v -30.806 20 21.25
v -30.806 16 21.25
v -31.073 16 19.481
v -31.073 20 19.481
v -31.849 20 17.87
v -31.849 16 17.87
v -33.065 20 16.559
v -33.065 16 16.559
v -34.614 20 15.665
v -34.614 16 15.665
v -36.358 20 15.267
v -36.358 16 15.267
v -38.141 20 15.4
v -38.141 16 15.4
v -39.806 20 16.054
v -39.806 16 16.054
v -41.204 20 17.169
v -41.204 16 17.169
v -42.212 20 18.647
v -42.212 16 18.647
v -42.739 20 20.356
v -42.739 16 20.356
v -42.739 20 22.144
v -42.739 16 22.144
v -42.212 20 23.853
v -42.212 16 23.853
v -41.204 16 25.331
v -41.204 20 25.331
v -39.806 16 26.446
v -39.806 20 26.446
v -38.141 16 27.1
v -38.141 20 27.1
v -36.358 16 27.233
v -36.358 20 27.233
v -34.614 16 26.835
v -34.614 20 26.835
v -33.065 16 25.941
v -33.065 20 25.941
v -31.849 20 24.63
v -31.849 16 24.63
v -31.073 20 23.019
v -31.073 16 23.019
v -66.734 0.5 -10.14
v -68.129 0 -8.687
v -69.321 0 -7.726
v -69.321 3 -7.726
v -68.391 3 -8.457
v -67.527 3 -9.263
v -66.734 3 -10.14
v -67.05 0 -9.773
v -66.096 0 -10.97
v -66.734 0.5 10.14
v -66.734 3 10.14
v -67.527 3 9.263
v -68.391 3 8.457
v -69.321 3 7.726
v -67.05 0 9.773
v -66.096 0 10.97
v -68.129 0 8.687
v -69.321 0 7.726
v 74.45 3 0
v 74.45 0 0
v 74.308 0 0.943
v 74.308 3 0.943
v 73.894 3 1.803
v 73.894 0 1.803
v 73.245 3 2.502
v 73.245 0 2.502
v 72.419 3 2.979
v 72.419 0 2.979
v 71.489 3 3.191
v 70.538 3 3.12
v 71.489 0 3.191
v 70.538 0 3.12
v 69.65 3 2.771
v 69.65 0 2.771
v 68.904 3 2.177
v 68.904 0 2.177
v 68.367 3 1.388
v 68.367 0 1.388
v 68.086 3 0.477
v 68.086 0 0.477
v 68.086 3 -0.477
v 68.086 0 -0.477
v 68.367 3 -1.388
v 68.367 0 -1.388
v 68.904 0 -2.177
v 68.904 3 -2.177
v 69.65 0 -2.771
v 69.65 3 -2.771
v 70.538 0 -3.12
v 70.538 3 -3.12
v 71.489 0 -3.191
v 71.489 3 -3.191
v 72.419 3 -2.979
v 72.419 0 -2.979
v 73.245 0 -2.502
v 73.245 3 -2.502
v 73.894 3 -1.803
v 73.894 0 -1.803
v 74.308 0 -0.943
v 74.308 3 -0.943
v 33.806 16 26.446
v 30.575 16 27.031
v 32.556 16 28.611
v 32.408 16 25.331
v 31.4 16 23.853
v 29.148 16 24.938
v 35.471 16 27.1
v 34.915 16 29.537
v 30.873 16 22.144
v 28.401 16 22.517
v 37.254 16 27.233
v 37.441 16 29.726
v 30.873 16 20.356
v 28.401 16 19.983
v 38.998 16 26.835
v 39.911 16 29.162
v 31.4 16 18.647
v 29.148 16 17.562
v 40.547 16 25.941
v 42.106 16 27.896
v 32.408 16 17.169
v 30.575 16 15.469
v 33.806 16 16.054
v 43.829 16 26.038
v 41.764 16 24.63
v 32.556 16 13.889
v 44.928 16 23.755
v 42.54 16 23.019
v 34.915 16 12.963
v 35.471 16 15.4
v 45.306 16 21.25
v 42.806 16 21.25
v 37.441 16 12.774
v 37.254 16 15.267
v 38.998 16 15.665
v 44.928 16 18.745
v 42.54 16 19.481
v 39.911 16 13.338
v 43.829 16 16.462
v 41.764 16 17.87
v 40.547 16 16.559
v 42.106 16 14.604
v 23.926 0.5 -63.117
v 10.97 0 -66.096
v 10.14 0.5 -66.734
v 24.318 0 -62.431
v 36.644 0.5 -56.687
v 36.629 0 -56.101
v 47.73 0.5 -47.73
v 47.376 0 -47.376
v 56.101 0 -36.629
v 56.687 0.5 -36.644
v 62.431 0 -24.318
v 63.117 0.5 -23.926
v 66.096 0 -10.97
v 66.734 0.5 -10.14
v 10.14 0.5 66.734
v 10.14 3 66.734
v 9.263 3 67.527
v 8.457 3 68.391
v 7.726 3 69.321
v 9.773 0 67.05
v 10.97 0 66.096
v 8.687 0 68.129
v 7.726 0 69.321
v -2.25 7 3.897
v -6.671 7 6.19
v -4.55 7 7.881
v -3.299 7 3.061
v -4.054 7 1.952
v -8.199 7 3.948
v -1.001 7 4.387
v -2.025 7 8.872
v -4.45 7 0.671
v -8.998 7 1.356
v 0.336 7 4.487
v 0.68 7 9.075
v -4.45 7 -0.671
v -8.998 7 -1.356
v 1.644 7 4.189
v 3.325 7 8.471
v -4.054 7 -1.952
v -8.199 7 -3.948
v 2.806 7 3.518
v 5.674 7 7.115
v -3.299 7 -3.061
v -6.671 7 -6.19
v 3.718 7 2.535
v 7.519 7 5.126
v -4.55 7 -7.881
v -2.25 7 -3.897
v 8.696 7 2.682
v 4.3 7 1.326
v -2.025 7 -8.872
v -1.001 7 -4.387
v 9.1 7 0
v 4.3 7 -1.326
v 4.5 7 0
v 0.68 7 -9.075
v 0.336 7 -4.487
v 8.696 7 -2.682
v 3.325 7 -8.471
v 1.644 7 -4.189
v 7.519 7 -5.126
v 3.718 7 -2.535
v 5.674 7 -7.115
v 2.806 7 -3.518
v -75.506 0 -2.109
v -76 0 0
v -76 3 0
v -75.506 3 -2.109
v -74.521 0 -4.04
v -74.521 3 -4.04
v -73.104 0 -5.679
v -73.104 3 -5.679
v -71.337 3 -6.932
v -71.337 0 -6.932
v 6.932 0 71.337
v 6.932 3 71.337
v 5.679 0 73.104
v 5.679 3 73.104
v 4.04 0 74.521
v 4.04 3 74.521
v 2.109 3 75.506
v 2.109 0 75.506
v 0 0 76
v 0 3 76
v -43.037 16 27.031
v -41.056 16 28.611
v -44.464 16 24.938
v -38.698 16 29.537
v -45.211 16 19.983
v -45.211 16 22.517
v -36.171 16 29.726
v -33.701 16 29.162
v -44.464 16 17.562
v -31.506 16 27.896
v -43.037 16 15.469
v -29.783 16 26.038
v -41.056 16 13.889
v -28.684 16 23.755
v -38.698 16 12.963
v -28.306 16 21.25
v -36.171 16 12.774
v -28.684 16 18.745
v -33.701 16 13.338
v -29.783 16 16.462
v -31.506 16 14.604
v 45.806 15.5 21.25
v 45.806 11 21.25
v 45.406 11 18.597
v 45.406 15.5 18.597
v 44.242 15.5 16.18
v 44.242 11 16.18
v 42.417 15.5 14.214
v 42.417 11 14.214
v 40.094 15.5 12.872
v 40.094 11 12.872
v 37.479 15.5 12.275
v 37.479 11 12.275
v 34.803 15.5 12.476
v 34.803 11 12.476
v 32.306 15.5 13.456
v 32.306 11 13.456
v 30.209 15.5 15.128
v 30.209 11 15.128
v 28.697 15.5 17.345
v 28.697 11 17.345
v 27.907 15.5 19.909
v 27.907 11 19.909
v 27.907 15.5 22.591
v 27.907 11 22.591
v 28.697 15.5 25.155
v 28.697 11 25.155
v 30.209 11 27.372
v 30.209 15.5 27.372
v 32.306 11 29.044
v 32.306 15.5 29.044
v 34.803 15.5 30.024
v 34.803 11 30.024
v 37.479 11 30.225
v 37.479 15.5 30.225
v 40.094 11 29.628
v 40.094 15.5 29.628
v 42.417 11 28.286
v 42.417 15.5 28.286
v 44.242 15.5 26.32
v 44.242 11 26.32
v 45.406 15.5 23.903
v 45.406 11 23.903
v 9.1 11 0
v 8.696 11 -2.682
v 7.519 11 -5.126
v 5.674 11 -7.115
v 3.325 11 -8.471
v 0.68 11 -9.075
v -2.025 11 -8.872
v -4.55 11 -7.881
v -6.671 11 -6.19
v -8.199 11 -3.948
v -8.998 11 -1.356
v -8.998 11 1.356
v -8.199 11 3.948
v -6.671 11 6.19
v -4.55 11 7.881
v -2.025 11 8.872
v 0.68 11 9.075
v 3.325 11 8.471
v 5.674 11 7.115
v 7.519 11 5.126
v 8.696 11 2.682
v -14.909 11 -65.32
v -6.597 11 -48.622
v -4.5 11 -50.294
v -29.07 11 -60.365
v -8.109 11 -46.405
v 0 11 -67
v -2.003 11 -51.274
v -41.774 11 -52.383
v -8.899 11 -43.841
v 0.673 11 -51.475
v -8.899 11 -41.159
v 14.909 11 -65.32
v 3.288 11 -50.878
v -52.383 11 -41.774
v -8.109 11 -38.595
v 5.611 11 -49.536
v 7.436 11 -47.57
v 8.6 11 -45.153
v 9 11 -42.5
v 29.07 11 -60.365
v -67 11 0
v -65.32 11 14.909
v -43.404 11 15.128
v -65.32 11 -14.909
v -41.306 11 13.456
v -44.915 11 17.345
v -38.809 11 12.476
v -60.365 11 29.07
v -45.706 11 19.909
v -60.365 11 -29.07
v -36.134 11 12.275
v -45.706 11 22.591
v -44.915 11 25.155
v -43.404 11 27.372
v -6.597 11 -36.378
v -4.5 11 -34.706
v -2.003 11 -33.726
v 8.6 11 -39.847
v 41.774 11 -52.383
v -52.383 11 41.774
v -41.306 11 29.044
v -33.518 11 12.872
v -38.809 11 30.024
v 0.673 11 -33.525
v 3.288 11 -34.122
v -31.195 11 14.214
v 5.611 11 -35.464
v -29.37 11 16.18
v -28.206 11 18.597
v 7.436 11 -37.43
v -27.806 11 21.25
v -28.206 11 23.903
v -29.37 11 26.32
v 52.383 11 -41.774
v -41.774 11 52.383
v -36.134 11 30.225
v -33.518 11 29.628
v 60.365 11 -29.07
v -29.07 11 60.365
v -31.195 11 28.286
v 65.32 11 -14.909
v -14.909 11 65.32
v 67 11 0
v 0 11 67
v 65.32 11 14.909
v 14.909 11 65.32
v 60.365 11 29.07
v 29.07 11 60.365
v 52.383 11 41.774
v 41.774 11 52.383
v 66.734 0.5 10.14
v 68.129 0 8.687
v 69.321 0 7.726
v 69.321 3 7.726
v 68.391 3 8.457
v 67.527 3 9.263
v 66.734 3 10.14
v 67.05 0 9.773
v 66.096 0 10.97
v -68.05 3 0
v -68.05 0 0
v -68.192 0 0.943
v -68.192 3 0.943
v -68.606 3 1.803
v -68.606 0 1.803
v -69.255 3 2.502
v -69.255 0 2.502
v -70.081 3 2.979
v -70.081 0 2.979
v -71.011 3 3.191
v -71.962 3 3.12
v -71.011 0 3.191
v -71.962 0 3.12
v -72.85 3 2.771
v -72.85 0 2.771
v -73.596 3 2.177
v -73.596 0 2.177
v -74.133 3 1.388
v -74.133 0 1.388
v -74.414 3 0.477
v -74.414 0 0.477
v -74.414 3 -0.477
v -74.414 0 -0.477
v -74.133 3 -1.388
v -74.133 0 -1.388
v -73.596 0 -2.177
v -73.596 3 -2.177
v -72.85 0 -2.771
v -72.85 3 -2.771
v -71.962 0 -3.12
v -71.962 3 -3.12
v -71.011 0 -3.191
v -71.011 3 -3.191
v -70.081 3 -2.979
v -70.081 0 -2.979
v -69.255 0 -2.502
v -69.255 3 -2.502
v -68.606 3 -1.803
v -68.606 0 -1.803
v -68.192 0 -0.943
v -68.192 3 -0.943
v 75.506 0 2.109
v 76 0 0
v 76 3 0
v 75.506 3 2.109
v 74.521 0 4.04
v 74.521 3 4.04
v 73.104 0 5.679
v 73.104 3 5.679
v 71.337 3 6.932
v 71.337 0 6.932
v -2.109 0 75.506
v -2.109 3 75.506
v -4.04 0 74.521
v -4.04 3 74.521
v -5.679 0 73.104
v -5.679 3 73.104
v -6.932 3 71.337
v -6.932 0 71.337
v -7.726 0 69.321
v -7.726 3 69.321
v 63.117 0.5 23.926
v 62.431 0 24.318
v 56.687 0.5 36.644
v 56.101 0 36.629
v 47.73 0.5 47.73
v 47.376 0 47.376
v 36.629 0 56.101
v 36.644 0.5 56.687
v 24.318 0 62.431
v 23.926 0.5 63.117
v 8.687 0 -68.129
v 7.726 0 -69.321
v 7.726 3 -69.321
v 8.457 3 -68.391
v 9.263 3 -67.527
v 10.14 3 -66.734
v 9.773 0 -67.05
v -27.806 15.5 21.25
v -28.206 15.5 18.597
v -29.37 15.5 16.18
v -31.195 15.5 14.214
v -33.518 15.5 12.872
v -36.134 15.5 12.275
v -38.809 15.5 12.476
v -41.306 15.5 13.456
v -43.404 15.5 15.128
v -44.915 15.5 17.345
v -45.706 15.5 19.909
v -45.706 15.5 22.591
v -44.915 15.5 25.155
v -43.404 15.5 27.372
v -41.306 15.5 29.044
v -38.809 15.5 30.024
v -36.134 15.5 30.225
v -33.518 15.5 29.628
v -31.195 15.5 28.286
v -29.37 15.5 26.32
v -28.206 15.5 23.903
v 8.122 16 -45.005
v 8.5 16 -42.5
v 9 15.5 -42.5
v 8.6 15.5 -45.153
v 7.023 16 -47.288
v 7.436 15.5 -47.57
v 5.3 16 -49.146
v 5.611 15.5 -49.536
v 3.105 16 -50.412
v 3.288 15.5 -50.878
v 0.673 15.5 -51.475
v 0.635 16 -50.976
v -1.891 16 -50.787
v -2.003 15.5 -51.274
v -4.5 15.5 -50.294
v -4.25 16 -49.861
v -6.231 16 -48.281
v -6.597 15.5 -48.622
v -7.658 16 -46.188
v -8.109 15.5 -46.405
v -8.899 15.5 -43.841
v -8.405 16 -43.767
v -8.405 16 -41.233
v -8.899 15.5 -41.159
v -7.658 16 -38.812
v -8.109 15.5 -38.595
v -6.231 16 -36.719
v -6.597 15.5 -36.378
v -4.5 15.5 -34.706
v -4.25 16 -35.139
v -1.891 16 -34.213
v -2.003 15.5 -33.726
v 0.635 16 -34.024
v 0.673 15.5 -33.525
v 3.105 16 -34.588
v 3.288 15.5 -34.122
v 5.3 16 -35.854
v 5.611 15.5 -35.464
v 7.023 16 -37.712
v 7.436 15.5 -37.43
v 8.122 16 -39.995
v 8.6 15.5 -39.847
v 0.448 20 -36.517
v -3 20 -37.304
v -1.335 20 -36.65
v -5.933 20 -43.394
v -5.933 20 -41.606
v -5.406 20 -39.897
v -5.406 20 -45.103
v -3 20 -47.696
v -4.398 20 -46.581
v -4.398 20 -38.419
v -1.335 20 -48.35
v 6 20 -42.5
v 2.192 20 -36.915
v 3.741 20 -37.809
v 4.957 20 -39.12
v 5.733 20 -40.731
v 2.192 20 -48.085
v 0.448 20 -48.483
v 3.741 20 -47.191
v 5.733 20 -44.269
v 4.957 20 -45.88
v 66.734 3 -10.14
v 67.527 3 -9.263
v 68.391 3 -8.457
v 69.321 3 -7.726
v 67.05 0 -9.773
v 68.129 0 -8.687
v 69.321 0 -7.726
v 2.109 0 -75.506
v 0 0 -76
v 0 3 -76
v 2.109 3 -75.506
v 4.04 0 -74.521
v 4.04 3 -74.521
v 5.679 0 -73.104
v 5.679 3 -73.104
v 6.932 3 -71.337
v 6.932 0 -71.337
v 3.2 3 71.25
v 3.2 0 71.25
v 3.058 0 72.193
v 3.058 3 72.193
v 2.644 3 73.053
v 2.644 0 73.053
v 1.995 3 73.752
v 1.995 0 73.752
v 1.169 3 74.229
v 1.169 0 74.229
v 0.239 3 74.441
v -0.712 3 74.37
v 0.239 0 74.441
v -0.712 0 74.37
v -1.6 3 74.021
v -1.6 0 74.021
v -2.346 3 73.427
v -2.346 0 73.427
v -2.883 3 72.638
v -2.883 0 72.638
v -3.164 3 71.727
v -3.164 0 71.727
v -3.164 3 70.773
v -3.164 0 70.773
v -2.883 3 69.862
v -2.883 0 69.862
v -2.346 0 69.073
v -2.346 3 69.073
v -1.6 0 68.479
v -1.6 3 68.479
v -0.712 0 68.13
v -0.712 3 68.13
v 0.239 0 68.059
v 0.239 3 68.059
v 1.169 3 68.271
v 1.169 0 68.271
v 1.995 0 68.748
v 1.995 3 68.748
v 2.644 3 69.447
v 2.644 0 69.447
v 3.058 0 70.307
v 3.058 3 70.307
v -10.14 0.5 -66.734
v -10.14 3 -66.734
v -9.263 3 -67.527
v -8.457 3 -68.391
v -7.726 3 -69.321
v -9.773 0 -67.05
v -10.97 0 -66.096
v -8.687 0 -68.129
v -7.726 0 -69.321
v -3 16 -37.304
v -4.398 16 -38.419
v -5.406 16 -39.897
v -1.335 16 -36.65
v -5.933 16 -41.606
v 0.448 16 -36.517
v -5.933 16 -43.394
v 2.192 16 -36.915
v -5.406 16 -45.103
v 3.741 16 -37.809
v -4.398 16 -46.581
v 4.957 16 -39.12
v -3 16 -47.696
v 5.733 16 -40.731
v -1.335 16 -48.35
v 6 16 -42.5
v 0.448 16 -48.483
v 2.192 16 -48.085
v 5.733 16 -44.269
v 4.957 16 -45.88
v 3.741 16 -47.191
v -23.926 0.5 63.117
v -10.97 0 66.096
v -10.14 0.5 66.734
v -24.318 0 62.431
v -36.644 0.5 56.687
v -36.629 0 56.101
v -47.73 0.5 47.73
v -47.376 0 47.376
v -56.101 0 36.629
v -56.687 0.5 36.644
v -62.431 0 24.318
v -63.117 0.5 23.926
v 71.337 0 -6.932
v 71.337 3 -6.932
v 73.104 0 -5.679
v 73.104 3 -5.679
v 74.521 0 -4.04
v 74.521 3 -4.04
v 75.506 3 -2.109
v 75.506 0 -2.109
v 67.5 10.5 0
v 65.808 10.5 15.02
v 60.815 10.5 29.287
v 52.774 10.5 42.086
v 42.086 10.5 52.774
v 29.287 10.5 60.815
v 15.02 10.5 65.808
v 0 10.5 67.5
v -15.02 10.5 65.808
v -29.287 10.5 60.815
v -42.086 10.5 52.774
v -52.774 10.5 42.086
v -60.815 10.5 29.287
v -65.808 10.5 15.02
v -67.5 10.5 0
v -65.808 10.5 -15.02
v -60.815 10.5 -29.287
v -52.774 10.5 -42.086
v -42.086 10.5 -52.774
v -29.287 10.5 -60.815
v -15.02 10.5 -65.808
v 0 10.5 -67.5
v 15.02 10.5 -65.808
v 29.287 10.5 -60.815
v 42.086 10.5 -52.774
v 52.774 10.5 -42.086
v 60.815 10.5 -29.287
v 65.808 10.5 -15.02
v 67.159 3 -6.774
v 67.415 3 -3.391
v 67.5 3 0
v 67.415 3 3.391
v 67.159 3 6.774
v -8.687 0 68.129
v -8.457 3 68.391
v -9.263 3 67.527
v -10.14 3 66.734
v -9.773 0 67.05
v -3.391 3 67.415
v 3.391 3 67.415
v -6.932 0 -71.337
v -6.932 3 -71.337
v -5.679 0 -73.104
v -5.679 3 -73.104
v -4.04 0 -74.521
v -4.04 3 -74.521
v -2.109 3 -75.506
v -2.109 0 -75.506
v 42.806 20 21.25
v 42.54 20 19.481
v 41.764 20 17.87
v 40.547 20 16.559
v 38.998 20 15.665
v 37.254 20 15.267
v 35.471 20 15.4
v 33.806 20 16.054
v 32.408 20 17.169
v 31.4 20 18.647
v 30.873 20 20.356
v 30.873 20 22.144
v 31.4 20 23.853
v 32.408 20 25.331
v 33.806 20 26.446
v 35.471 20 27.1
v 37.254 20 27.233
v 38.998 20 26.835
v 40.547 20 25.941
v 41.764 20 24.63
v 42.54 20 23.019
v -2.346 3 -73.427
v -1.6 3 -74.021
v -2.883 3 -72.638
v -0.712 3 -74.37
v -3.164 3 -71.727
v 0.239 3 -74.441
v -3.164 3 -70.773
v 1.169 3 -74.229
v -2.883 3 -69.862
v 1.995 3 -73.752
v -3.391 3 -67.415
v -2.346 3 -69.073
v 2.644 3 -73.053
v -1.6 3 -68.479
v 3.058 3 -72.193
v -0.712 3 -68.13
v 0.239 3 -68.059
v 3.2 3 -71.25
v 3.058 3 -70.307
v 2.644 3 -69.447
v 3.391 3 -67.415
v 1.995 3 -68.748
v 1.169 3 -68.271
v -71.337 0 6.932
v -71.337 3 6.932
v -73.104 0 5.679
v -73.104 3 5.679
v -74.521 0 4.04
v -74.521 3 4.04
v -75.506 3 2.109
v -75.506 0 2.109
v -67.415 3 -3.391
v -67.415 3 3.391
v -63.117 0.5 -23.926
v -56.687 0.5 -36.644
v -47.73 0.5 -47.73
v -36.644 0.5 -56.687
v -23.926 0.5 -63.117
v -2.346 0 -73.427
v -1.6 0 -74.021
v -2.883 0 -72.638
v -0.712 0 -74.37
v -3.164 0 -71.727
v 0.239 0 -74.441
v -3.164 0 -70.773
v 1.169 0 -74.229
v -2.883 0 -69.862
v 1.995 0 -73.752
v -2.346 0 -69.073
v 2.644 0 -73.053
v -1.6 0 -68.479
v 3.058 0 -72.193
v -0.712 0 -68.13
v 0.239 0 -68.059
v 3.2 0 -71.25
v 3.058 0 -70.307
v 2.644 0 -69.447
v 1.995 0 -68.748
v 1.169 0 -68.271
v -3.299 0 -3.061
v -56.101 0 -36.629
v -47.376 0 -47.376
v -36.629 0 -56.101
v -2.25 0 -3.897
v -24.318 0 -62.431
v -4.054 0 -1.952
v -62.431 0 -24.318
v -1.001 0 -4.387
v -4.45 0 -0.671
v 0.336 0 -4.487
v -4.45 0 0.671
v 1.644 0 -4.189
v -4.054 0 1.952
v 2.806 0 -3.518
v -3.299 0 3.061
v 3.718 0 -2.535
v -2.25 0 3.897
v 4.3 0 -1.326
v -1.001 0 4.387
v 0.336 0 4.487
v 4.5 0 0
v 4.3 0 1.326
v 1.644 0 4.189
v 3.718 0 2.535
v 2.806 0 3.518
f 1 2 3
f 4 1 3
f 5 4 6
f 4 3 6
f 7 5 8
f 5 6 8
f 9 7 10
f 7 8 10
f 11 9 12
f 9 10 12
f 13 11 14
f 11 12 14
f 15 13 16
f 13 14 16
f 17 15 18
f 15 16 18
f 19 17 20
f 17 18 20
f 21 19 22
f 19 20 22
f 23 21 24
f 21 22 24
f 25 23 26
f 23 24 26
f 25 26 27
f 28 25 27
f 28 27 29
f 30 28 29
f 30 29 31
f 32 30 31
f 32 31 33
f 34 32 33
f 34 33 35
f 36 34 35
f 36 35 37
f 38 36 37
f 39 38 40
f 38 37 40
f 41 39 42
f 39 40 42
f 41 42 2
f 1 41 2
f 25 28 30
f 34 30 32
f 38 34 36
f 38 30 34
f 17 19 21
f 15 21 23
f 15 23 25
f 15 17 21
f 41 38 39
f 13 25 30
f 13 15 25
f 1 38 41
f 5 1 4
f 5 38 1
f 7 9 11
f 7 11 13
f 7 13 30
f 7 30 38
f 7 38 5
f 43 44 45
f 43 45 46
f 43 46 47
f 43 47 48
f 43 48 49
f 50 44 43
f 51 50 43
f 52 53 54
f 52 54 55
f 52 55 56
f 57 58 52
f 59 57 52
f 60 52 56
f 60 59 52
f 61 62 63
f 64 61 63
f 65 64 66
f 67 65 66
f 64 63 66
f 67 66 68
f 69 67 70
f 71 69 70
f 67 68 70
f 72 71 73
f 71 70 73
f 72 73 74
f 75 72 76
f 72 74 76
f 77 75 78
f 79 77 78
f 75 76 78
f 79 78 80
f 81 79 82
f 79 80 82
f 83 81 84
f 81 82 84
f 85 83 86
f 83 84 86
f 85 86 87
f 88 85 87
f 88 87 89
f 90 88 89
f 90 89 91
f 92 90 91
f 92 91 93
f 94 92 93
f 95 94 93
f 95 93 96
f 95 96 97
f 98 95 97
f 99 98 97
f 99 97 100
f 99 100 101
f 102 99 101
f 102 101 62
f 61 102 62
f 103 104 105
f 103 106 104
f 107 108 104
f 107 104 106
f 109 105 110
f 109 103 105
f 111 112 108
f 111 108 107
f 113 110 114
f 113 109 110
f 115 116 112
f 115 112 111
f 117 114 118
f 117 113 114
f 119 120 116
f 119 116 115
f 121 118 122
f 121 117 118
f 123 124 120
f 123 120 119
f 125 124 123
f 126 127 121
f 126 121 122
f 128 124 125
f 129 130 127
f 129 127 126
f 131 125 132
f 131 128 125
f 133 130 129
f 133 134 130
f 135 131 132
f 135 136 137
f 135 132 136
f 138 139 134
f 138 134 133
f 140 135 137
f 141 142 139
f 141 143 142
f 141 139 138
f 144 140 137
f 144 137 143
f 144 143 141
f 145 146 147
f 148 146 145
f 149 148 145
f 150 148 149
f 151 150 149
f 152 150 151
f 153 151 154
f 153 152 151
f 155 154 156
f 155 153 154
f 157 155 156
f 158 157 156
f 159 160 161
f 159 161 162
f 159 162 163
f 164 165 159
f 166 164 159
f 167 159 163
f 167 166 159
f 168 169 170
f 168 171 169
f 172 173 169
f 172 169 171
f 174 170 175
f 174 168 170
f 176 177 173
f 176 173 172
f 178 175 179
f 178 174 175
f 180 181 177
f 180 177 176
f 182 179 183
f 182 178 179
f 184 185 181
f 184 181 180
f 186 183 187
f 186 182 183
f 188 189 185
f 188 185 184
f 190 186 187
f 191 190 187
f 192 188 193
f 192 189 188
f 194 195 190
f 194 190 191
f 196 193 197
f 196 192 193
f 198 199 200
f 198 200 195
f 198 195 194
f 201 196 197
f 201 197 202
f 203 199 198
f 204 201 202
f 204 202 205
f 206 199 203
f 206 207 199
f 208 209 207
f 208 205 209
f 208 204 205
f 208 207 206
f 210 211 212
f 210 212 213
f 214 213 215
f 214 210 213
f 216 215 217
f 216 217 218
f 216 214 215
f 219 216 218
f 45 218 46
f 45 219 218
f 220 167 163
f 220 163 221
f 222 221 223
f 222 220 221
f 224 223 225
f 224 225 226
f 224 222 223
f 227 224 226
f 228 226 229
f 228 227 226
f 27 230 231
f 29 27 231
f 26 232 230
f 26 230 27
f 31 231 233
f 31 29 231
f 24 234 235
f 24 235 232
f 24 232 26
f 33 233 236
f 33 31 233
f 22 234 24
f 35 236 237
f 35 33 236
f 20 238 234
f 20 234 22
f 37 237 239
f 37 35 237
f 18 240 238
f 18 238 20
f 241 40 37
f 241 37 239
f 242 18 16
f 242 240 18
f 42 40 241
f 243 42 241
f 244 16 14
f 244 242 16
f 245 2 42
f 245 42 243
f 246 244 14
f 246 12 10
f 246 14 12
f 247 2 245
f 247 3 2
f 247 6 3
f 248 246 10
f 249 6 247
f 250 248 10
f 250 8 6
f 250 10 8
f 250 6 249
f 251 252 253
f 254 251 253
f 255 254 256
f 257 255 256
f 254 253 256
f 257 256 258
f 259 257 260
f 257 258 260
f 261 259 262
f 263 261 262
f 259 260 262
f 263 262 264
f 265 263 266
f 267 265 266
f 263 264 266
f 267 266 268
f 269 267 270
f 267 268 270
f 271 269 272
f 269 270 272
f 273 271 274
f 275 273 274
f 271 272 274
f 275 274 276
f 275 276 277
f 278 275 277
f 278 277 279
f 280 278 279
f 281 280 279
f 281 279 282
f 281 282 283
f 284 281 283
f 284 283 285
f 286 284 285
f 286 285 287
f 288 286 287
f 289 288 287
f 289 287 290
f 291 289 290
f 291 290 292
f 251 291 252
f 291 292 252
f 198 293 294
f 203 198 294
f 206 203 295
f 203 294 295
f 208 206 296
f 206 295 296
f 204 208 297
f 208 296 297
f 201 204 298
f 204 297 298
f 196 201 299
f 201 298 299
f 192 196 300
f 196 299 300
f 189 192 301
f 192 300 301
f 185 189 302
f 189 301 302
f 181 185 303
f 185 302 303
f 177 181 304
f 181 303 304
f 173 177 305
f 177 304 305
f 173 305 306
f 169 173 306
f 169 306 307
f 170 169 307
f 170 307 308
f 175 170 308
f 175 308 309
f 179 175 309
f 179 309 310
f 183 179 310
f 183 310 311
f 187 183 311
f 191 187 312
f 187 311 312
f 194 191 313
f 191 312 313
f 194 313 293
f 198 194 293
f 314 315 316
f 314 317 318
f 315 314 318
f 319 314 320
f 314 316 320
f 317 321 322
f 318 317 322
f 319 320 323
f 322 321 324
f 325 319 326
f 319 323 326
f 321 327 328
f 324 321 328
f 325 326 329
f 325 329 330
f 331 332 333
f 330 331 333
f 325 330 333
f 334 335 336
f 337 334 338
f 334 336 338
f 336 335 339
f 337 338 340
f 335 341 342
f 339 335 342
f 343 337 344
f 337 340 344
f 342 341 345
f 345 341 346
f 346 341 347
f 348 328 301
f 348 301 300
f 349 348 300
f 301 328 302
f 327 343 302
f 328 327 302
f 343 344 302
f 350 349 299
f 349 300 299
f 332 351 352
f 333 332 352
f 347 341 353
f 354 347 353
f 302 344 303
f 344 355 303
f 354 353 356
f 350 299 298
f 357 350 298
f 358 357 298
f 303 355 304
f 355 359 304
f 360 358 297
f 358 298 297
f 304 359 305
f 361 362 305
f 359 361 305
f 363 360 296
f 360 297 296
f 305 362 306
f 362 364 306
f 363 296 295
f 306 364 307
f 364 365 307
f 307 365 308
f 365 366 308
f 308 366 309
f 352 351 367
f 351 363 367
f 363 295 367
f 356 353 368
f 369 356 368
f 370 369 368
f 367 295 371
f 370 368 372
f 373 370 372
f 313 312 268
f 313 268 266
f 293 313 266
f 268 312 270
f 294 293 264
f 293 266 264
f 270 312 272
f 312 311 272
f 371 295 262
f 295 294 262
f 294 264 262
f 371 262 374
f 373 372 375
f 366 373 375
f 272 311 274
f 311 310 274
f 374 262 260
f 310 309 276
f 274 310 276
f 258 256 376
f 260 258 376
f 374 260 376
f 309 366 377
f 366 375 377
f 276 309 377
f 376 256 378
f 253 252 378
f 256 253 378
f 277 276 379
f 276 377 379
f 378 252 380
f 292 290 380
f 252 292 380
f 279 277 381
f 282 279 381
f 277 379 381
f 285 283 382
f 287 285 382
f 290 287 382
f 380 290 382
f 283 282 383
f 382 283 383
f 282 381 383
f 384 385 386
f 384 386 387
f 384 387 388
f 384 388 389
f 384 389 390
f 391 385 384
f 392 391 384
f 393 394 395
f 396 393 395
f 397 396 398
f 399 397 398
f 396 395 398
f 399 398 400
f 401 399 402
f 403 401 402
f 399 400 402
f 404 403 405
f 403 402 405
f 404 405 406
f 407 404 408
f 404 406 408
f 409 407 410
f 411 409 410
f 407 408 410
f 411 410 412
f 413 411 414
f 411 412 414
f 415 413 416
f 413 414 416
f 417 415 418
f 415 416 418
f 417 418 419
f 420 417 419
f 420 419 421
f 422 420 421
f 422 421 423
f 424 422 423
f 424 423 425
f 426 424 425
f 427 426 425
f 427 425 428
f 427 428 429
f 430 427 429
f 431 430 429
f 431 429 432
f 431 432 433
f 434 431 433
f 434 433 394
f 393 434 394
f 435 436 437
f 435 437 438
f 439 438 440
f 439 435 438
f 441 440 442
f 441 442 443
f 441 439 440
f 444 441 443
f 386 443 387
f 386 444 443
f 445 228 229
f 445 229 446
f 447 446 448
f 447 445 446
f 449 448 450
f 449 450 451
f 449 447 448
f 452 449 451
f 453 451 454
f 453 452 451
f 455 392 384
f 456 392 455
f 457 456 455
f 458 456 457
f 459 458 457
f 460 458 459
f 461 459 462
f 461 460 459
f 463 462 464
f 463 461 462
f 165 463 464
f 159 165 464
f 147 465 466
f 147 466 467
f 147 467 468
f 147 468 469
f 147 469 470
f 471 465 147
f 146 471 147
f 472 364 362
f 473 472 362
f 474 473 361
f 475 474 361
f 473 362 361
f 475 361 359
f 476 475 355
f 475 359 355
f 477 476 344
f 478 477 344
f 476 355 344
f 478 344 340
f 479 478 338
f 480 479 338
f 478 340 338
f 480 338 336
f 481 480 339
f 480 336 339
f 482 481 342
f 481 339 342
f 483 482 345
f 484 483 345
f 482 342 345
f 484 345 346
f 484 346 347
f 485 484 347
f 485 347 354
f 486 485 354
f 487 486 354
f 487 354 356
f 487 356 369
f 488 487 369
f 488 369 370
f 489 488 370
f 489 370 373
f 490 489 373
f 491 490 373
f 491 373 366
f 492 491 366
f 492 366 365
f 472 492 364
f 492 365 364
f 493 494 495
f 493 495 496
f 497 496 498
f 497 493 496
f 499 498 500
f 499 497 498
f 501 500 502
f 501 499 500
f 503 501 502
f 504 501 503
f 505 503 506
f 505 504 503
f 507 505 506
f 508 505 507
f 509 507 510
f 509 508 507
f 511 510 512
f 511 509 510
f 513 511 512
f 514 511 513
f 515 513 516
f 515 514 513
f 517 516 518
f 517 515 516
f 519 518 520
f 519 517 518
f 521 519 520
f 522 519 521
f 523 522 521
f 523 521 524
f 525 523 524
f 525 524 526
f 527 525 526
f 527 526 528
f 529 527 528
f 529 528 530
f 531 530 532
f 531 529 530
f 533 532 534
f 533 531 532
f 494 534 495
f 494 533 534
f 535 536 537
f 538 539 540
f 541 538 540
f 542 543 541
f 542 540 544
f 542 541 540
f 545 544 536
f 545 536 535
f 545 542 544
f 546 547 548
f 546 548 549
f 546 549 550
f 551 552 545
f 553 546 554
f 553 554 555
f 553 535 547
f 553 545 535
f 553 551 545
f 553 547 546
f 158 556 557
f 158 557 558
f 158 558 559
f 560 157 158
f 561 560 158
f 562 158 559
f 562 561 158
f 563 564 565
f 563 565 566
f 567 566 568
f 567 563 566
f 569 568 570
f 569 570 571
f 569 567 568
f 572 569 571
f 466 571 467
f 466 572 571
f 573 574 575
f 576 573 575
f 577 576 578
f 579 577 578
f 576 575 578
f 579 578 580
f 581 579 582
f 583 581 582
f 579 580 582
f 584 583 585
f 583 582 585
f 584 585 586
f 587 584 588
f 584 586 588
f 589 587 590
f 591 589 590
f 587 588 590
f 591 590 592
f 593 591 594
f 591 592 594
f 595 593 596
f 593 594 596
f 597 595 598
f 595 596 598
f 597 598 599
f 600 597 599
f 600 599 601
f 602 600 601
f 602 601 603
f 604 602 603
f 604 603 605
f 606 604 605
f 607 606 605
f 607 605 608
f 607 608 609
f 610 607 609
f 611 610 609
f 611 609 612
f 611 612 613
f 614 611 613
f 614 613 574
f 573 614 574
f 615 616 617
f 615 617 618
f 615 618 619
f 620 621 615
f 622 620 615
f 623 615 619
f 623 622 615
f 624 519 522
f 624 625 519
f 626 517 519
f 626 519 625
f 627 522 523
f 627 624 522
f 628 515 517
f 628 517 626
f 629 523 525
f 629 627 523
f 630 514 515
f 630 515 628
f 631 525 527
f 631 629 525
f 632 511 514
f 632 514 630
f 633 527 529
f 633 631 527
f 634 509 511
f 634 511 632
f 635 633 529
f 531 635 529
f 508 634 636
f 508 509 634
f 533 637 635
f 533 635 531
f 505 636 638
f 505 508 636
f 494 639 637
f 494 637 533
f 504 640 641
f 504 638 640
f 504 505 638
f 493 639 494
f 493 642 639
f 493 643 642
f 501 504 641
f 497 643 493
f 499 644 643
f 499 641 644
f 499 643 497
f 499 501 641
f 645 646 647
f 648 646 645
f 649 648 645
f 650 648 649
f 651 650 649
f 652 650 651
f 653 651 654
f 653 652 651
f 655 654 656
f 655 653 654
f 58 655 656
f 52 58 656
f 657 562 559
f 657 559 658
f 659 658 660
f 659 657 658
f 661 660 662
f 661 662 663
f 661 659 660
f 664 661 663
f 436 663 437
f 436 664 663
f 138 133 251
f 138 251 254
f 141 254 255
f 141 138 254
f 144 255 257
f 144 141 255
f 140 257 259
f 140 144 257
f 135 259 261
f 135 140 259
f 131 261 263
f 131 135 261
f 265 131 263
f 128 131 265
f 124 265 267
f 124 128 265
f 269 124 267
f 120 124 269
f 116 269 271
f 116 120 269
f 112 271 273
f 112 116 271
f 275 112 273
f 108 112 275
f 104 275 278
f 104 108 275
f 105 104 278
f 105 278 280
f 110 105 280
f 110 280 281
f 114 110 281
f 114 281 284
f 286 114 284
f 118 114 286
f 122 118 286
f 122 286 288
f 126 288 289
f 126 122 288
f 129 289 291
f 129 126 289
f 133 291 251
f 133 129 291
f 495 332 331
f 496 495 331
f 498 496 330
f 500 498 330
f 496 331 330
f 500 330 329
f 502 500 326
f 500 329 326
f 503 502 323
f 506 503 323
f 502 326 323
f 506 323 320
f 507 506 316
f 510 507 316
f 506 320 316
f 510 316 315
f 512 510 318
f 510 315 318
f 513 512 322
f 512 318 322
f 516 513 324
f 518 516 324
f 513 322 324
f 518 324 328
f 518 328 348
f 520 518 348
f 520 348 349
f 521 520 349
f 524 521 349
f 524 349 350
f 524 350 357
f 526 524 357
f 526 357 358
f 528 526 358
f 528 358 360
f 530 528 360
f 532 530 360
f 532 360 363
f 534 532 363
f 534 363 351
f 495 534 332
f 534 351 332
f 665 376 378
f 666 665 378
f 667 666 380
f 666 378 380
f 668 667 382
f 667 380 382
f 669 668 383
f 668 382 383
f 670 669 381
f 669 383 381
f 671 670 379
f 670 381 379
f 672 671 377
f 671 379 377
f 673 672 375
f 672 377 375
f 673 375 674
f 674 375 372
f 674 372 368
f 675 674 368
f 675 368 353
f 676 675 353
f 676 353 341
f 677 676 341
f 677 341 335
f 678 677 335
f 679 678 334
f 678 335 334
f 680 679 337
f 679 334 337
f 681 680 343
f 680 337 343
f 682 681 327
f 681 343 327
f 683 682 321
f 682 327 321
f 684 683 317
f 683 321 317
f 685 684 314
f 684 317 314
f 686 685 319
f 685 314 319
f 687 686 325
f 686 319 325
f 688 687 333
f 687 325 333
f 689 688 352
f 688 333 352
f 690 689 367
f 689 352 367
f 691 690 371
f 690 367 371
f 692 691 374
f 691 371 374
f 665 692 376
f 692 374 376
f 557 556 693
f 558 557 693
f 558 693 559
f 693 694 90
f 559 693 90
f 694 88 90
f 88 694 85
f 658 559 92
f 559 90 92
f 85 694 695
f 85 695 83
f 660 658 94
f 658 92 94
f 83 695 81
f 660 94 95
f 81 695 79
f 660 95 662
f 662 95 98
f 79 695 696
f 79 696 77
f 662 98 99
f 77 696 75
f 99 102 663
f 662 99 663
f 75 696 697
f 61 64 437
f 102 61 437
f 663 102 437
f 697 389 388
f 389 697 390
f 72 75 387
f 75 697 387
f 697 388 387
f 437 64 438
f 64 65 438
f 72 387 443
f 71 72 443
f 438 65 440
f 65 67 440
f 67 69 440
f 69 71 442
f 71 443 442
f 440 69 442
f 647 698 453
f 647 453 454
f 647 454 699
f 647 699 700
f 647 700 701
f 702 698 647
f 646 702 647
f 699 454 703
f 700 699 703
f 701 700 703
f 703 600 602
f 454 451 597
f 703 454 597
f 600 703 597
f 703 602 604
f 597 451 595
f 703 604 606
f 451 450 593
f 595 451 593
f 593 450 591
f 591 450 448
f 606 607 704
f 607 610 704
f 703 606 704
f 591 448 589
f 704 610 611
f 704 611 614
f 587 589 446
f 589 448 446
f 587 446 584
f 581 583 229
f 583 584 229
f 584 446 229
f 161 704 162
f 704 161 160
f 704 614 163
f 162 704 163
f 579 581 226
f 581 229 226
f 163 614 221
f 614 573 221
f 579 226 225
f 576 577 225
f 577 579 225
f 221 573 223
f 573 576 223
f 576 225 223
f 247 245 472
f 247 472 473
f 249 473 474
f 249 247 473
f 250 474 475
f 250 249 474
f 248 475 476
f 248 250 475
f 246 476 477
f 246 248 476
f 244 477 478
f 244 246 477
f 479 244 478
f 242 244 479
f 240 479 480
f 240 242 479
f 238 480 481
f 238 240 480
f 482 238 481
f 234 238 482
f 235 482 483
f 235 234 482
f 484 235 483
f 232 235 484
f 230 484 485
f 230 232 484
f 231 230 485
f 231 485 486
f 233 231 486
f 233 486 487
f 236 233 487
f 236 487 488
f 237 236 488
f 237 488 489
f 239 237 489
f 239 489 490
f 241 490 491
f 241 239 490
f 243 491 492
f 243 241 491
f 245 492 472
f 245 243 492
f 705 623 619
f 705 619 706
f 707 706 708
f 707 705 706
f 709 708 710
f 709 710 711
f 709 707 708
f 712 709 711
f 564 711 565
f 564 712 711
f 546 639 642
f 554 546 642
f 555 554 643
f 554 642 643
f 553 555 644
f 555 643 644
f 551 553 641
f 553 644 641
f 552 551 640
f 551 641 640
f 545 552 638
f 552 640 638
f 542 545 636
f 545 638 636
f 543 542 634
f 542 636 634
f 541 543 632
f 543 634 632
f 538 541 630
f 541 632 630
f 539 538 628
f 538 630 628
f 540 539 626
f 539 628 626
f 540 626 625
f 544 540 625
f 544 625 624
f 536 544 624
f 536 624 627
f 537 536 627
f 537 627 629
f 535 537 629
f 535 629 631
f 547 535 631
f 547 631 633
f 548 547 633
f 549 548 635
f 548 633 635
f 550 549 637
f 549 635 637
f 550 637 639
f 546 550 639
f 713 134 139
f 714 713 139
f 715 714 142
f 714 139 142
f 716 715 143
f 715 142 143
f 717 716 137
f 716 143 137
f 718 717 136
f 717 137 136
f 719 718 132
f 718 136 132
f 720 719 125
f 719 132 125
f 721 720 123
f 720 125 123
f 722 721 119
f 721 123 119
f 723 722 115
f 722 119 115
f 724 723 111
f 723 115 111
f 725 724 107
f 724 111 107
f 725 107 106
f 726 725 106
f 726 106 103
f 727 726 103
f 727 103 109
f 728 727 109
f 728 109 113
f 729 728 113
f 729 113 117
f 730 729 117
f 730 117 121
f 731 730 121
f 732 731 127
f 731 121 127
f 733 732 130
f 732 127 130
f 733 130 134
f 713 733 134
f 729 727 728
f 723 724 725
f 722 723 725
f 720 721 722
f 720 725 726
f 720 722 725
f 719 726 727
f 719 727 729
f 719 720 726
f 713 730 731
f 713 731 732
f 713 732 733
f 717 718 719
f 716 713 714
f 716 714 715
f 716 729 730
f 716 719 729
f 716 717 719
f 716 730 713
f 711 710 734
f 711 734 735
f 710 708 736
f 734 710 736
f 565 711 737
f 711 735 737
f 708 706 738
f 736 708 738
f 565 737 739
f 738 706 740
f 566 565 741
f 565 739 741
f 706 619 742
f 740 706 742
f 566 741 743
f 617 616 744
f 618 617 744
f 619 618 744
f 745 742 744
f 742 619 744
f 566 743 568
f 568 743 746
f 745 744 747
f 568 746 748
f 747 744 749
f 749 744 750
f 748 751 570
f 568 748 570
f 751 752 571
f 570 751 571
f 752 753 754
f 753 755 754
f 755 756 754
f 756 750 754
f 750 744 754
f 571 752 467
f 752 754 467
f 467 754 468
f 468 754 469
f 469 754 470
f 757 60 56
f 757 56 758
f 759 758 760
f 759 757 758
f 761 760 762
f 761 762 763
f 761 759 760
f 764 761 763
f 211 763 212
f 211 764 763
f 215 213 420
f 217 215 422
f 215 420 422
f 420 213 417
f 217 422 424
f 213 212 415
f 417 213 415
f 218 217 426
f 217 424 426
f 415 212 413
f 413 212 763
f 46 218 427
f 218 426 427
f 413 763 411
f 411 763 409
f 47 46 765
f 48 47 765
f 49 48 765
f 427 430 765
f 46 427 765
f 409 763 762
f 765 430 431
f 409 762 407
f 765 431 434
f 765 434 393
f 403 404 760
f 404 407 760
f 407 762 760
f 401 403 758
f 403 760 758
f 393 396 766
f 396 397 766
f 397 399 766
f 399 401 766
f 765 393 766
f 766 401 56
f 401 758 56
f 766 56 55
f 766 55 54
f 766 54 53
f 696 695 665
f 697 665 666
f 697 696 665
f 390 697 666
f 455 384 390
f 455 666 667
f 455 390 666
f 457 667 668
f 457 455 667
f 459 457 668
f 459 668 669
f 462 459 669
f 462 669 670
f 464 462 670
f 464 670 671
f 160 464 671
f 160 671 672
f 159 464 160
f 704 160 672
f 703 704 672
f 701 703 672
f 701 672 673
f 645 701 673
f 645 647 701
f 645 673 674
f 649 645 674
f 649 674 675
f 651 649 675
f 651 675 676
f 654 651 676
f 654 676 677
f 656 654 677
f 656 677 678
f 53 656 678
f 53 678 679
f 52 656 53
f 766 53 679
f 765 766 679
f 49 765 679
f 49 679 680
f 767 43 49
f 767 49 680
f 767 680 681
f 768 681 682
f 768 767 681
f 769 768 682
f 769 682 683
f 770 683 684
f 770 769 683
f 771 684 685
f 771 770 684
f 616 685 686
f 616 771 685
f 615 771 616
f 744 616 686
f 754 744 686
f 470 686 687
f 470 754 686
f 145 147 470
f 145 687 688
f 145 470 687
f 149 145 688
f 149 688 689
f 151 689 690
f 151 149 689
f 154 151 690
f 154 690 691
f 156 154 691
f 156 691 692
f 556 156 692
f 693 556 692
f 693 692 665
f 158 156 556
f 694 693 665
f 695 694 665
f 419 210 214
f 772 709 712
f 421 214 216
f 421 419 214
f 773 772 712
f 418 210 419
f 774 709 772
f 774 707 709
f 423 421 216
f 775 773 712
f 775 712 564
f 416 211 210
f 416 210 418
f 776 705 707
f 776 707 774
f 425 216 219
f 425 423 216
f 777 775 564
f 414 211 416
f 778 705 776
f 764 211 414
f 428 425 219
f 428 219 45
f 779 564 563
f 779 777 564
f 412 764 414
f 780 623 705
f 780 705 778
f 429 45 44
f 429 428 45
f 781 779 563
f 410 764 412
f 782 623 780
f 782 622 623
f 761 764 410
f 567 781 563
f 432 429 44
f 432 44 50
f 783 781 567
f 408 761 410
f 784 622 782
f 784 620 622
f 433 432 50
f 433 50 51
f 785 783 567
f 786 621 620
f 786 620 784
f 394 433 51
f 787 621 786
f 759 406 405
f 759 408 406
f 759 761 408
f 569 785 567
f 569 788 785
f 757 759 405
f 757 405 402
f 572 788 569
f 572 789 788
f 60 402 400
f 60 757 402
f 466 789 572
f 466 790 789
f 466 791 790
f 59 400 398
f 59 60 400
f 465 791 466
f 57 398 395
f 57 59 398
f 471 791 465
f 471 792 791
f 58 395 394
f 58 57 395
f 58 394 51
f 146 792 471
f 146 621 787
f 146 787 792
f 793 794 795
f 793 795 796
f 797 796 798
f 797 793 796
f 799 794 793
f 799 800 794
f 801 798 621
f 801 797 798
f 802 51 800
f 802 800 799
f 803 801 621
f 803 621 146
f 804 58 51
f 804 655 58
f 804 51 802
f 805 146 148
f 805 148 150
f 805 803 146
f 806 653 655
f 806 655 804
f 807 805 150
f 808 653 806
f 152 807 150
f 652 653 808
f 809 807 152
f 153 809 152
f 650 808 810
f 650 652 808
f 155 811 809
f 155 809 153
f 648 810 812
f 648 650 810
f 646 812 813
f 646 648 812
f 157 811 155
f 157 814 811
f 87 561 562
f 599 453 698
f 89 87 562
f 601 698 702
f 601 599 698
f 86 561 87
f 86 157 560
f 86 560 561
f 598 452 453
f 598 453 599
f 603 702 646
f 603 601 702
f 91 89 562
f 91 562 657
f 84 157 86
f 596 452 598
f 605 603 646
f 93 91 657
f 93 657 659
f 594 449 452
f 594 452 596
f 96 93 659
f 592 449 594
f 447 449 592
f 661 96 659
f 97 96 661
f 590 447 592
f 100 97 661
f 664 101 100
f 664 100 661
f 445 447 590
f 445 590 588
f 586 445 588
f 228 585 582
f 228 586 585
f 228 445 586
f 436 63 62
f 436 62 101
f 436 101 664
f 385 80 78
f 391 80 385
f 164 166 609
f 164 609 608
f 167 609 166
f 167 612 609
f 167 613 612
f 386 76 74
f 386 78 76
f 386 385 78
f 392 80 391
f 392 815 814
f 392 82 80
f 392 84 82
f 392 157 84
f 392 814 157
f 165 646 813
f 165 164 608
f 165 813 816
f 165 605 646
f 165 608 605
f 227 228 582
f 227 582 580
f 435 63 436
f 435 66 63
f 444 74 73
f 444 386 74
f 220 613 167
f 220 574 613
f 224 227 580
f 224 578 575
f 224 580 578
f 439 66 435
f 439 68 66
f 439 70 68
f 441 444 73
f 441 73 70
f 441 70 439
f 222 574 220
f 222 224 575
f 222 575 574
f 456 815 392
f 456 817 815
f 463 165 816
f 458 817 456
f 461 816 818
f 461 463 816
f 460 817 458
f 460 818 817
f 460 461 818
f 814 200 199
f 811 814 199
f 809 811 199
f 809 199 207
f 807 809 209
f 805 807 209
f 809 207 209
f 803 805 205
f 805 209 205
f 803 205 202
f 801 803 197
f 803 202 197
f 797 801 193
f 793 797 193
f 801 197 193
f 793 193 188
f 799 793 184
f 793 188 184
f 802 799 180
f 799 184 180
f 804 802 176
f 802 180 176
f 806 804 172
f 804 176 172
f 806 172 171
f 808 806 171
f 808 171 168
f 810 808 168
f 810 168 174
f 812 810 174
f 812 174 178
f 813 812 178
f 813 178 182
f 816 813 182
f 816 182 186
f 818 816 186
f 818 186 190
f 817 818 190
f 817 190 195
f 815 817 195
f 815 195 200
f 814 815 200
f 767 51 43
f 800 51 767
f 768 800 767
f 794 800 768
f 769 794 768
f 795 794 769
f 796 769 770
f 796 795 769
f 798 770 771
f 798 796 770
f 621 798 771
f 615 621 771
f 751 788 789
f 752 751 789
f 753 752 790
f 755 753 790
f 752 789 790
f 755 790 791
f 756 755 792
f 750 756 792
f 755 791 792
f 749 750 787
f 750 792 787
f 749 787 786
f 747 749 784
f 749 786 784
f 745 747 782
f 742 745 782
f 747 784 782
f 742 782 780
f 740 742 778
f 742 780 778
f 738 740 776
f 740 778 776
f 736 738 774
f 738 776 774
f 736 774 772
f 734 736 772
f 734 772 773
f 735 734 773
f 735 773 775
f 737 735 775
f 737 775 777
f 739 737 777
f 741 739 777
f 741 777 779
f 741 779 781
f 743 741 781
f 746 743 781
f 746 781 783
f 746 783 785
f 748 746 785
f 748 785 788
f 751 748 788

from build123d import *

# Parameters (mm, degrees)
SKETCH2_R            = 65
BOSS_EXTRUDE1_DEPTH  = 11
SKETCH3_R            = 9.1
CUT_EXTRUDE2_DEPTH   = 4
SKETCH4_R            = 4.5
CUT_EXTRUDE4_DEPTH   = 20
SKETCH5_R            = 67.5
SKETCH5_R_2          = 65
BOSS_EXTRUDE3_DEPTH  = 11
CHAMFER1_SIZE        = 0.5
CHAMFER2_SIZE        = 0.5
BOSS_EXTRUDE8_DEPTH  = 3
BOSS_EXTRUDE9_DEPTH  = 3
SKETCH8_R            = 3.2
CUT_EXTRUDE5_DEPTH   = 4
SKETCH9_R            = 9
BOSS_EXTRUDE10_DEPTH = 5
SKETCH10_R           = 6
BOSS_EXTRUDE11_DEPTH = 4
CHAMFER4_SIZE        = 0.5


with BuildPart() as part:
    # Sketch2 → Boss-Extrude1 (new body)
    with BuildSketch(Plane(origin=(0, 0, 0), x_dir=(1, 0, 0), z_dir=(0, 1, 0))):
        Circle(SKETCH2_R)
    extrude(amount=BOSS_EXTRUDE1_DEPTH)

    # Sketch3 → Cut-Extrude2 (cut)
    with BuildSketch(Plane(origin=(0, 11, 0), x_dir=(1, 0, 0), z_dir=(0, 1, 0))):
        Circle(SKETCH3_R)
    extrude(amount=-CUT_EXTRUDE2_DEPTH, mode=Mode.SUBTRACT)

    # Sketch4 → Cut-Extrude4 (cut)
    with BuildSketch(Plane(origin=(0, 7, 0), x_dir=(1, 0, 0), z_dir=(0, 1, 0))):
        Circle(SKETCH4_R)
    extrude(amount=-CUT_EXTRUDE4_DEPTH, mode=Mode.SUBTRACT)

    # Sketch5 → Boss-Extrude3 (add)
    with BuildSketch(Plane.XZ):
        Circle(SKETCH5_R)
        Circle(SKETCH5_R_2, mode=Mode.SUBTRACT)
    extrude(amount=-BOSS_EXTRUDE3_DEPTH)

    # Chamfer1
    chamfer1_edges = [part.edges().sort_by_distance(p)[0] for p in [
        (-67.5, 11, 0),
    ]]
    chamfer(chamfer1_edges, length=CHAMFER1_SIZE)

    # Chamfer2
    chamfer2_edges = [part.edges().sort_by_distance(p)[0] for p in [
        (-67.5, 0, 0),
    ]]
    chamfer(chamfer2_edges, length=CHAMFER2_SIZE)

    # Sketch6 → Boss-Extrude8 (add)
    with BuildSketch(Plane.XZ):
        with BuildLine():
            ThreePointArc((-5.99398228, 66.731343284), (-3, 66.932802123), (0, 67))
            Line((0, 67), (0, 74))
            ThreePointArc((0, 74), (-3.933906239, 72.64143706), (-6.037545702, 69.050335199))
            ThreePointArc((-6.037545702, 69.050335199), (-6.128886239, 67.888714183), (-5.99398228, 66.731343284))
        make_face()
        with BuildLine():
            Line((0, 74), (0, 67))
            ThreePointArc((0, 67), (3, 66.932802123), (5.99398228, 66.731343284))
            ThreePointArc((5.99398228, 66.731343284), (6.128886239, 67.888714183), (6.037545702, 69.050335199))
            ThreePointArc((6.037545702, 69.050335199), (3.933906239, 72.64143706), (0, 74))
        make_face()
        with BuildLine():
            ThreePointArc((6.037545702, 69.050335199), (6.128886239, 67.888714183), (5.99398228, 66.731343284))
            ThreePointArc((5.99398228, 66.731343284), (6.989304811, 66.634447685), (7.98307027, 66.522707319))
            ThreePointArc((7.98307027, 66.522707319), (6.839267191, 67.654870524), (6.037545702, 69.050335199))
        make_face()
        with BuildLine():
            ThreePointArc((-7.98307027, 66.522707319), (-6.989304811, 66.634447685), (-5.99398228, 66.731343284))
            ThreePointArc((-5.99398228, 66.731343284), (-6.128886239, 67.888714183), (-6.037545702, 69.050335199))
            ThreePointArc((-6.037545702, 69.050335199), (-6.839267191, 67.654870524), (-7.98307027, 66.522707319))
        make_face()
        with BuildLine():
            ThreePointArc((69.050335199, 6.037545702), (67.888714183, 6.128886239), (66.731343284, 5.99398228))
            ThreePointArc((66.731343284, 5.99398228), (66.932802123, 3), (67, 0))
            ThreePointArc((67, 0), (66.932802123, -3), (66.731343284, -5.99398228))
            ThreePointArc((66.731343284, -5.99398228), (67.888714183, -6.128886239), (69.050335199, -6.037545702))
            ThreePointArc((69.050335199, -6.037545702), (72.64143706, -3.933906239), (74, 0))
            ThreePointArc((74, 0), (72.64143706, 3.933906239), (69.050335199, 6.037545702))
        make_face()
        with BuildLine():
            ThreePointArc((69.050335199, 6.037545702), (67.654870524, 6.839267191), (66.522707319, 7.98307027))
            ThreePointArc((66.522707319, 7.98307027), (66.634447685, 6.989304811), (66.731343284, 5.99398228))
            ThreePointArc((66.731343284, 5.99398228), (67.888714183, 6.128886239), (69.050335199, 6.037545702))
        make_face()
        with BuildLine():
            ThreePointArc((69.050335199, -6.037545702), (67.888714183, -6.128886239), (66.731343284, -5.99398228))
            ThreePointArc((66.731343284, -5.99398228), (66.634447685, -6.989304811), (66.522707319, -7.98307027))
            ThreePointArc((66.522707319, -7.98307027), (67.654870524, -6.839267191), (69.050335199, -6.037545702))
        make_face()
        with BuildLine():
            ThreePointArc((5.99398228, -66.731343284), (0, -67), (-5.99398228, -66.731343284))
            ThreePointArc((-5.99398228, -66.731343284), (-6.128886239, -67.888714183), (-6.037545702, -69.050335199))
            ThreePointArc((-6.037545702, -69.050335199), (-3.933906239, -72.64143706), (0, -74))
            ThreePointArc((0, -74), (3.933906239, -72.64143706), (6.037545702, -69.050335199))
            ThreePointArc((6.037545702, -69.050335199), (6.128886239, -67.888714183), (5.99398228, -66.731343284))
        make_face()
        with BuildLine():
            ThreePointArc((-5.99398228, -66.731343284), (-6.989304811, -66.634447685), (-7.98307027, -66.522707319))
            ThreePointArc((-7.98307027, -66.522707319), (-6.839267191, -67.654870524), (-6.037545702, -69.050335199))
            ThreePointArc((-6.037545702, -69.050335199), (-6.128886239, -67.888714183), (-5.99398228, -66.731343284))
        make_face()
        with BuildLine():
            ThreePointArc((6.037545702, -69.050335199), (6.839267191, -67.654870524), (7.98307027, -66.522707319))
            ThreePointArc((7.98307027, -66.522707319), (6.989304811, -66.634447685), (5.99398228, -66.731343284))
            ThreePointArc((5.99398228, -66.731343284), (6.128886239, -67.888714183), (6.037545702, -69.050335199))
        make_face()
        with BuildLine():
            ThreePointArc((-66.731343284, -5.99398228), (-67, 0), (-66.731343284, 5.99398228))
            ThreePointArc((-66.731343284, 5.99398228), (-67.888714183, 6.128886239), (-69.050335199, 6.037545702))
            ThreePointArc((-69.050335199, 6.037545702), (-72.64143706, 3.933906239), (-74, 0))
            ThreePointArc((-74, 0), (-72.64143706, -3.933906239), (-69.050335199, -6.037545702))
            ThreePointArc((-69.050335199, -6.037545702), (-67.888714183, -6.128886239), (-66.731343284, -5.99398228))
        make_face()
        with BuildLine():
            ThreePointArc((-66.731343284, 5.99398228), (-66.634447685, 6.989304811), (-66.522707319, 7.98307027))
            ThreePointArc((-66.522707319, 7.98307027), (-67.654870524, 6.839267191), (-69.050335199, 6.037545702))
            ThreePointArc((-69.050335199, 6.037545702), (-67.888714183, 6.128886239), (-66.731343284, 5.99398228))
        make_face()
        with BuildLine():
            ThreePointArc((-66.522707319, -7.98307027), (-66.634447685, -6.989304811), (-66.731343284, -5.99398228))
            ThreePointArc((-66.731343284, -5.99398228), (-67.888714183, -6.128886239), (-69.050335199, -6.037545702))
            ThreePointArc((-69.050335199, -6.037545702), (-67.654870524, -6.839267191), (-66.522707319, -7.98307027))
        make_face()
    extrude(amount=-BOSS_EXTRUDE8_DEPTH)

    # Sketch7 → Boss-Extrude9 (add)
    with BuildSketch(Plane.XZ):
        with BuildLine():
            ThreePointArc((-6.037545702, 69.050335199), (-3.933906239, 72.64143706), (0, 74))
            Line((0, 74), (0, 76))
            ThreePointArc((0, 76), (-4.902011553, 73.862254638), (-7.725710636, 69.320625418))
            ThreePointArc((-7.725710636, 69.320625418), (-7.972938142, 67.9314334), (-8, 66.520673478))
            ThreePointArc((-8, 66.520673478), (-7.9915352, 66.521690937), (-7.98307027, 66.522707319))
            ThreePointArc((-7.98307027, 66.522707319), (-6.839267191, 67.654870524), (-6.037545702, 69.050335199))
        make_face()
        with BuildLine():
            Line((0, 76), (0, 74))
            ThreePointArc((0, 74), (3.933906239, 72.64143706), (6.037545702, 69.050335199))
            ThreePointArc((6.037545702, 69.050335199), (6.839267191, 67.654870524), (7.98307027, 66.522707319))
            ThreePointArc((7.98307027, 66.522707319), (7.9915352, 66.521690937), (8, 66.520673478))
            ThreePointArc((8, 66.520673478), (7.972938142, 67.9314334), (7.725710636, 69.320625418))
            ThreePointArc((7.725710636, 69.320625418), (4.902011553, 73.862254638), (0, 76))
        make_face()
        with BuildLine():
            ThreePointArc((7.725710636, 69.320625418), (7.972938142, 67.9314334), (8, 66.520673478))
            ThreePointArc((8, 66.520673478), (9.487263657, 66.324895992), (10.969771462, 66.095870628))
            ThreePointArc((10.969771462, 66.095870628), (9.215149033, 67.574862202), (7.725710636, 69.320625418))
        make_face()
        with BuildLine():
            ThreePointArc((-10.969771462, 66.095870628), (-9.487263657, 66.324895992), (-8, 66.520673478))
            ThreePointArc((-8, 66.520673478), (-7.972938142, 67.9314334), (-7.725710636, 69.320625418))
            ThreePointArc((-7.725710636, 69.320625418), (-9.215149033, 67.574862202), (-10.969771462, 66.095870628))
        make_face()
        with BuildLine():
            ThreePointArc((-66.522707319, 7.98307027), (-66.521690937, 7.9915352), (-66.520673478, 8))
            ThreePointArc((-66.520673478, 8), (-67.9314334, 7.972938142), (-69.320625418, 7.725710636))
            ThreePointArc((-69.320625418, 7.725710636), (-73.862254638, 4.902011553), (-76, 0))
            ThreePointArc((-76, 0), (-73.862254638, -4.902011553), (-69.320625418, -7.725710636))
            ThreePointArc((-69.320625418, -7.725710636), (-67.9314334, -7.972938142), (-66.520673478, -8))
            ThreePointArc((-66.520673478, -8), (-66.521690937, -7.9915352), (-66.522707319, -7.98307027))
            ThreePointArc((-66.522707319, -7.98307027), (-67.654870524, -6.839267191), (-69.050335199, -6.037545702))
            ThreePointArc((-69.050335199, -6.037545702), (-72.64143706, -3.933906239), (-74, 0))
            ThreePointArc((-74, 0), (-72.64143706, 3.933906239), (-69.050335199, 6.037545702))
            ThreePointArc((-69.050335199, 6.037545702), (-67.654870524, 6.839267191), (-66.522707319, 7.98307027))
        make_face()
        with BuildLine():
            ThreePointArc((-66.520673478, 8), (-66.324895992, 9.487263657), (-66.095870628, 10.969771462))
            ThreePointArc((-66.095870628, 10.969771462), (-67.574862202, 9.215149033), (-69.320625418, 7.725710636))
            ThreePointArc((-69.320625418, 7.725710636), (-67.9314334, 7.972938142), (-66.520673478, 8))
        make_face()
        with BuildLine():
            ThreePointArc((-66.520673478, -8), (-67.9314334, -7.972938142), (-69.320625418, -7.725710636))
            ThreePointArc((-69.320625418, -7.725710636), (-67.574862202, -9.215149033), (-66.095870628, -10.969771462))
            ThreePointArc((-66.095870628, -10.969771462), (-66.324895992, -9.487263657), (-66.520673478, -8))
        make_face()
        with BuildLine():
            ThreePointArc((-8, -66.520673478), (-9.487263657, -66.324895992), (-10.969771462, -66.095870628))
            ThreePointArc((-10.969771462, -66.095870628), (-9.215149033, -67.574862202), (-7.725710636, -69.320625418))
            ThreePointArc((-7.725710636, -69.320625418), (-7.972938142, -67.9314334), (-8, -66.520673478))
        make_face()
        with BuildLine():
            ThreePointArc((7.725710636, -69.320625418), (7.972938142, -67.9314334), (8, -66.520673478))
            ThreePointArc((8, -66.520673478), (7.9915352, -66.521690937), (7.98307027, -66.522707319))
            ThreePointArc((7.98307027, -66.522707319), (6.839267191, -67.654870524), (6.037545702, -69.050335199))
            ThreePointArc((6.037545702, -69.050335199), (3.933906239, -72.64143706), (0, -74))
            ThreePointArc((0, -74), (-3.933906239, -72.64143706), (-6.037545702, -69.050335199))
            ThreePointArc((-6.037545702, -69.050335199), (-6.839267191, -67.654870524), (-7.98307027, -66.522707319))
            ThreePointArc((-7.98307027, -66.522707319), (-7.9915352, -66.521690937), (-8, -66.520673478))
            ThreePointArc((-8, -66.520673478), (-7.972938142, -67.9314334), (-7.725710636, -69.320625418))
            ThreePointArc((-7.725710636, -69.320625418), (-4.902011553, -73.862254638), (0, -76))
            ThreePointArc((0, -76), (4.902011553, -73.862254638), (7.725710636, -69.320625418))
        make_face()
        with BuildLine():
            ThreePointArc((7.725710636, -69.320625418), (9.215149033, -67.574862202), (10.969771462, -66.095870628))
            ThreePointArc((10.969771462, -66.095870628), (9.487263657, -66.324895992), (8, -66.520673478))
            ThreePointArc((8, -66.520673478), (7.972938142, -67.9314334), (7.725710636, -69.320625418))
        make_face()
        with BuildLine():
            ThreePointArc((66.095870628, -10.969771462), (67.574862202, -9.215149033), (69.320625418, -7.725710636))
            ThreePointArc((69.320625418, -7.725710636), (67.9314334, -7.972938142), (66.520673478, -8))
            ThreePointArc((66.520673478, -8), (66.324895992, -9.487263657), (66.095870628, -10.969771462))
        make_face()
        with BuildLine():
            ThreePointArc((69.320625418, 7.725710636), (67.9314334, 7.972938142), (66.520673478, 8))
            ThreePointArc((66.520673478, 8), (66.521690937, 7.9915352), (66.522707319, 7.98307027))
            ThreePointArc((66.522707319, 7.98307027), (67.654870524, 6.839267191), (69.050335199, 6.037545702))
            ThreePointArc((69.050335199, 6.037545702), (72.64143706, 3.933906239), (74, 0))
            ThreePointArc((74, 0), (72.64143706, -3.933906239), (69.050335199, -6.037545702))
            ThreePointArc((69.050335199, -6.037545702), (67.654870524, -6.839267191), (66.522707319, -7.98307027))
            ThreePointArc((66.522707319, -7.98307027), (66.521690937, -7.9915352), (66.520673478, -8))
            ThreePointArc((66.520673478, -8), (67.9314334, -7.972938142), (69.320625418, -7.725710636))
            ThreePointArc((69.320625418, -7.725710636), (73.862254638, -4.902011553), (76, 0))
            ThreePointArc((76, 0), (73.862254638, 4.902011553), (69.320625418, 7.725710636))
        make_face()
        with BuildLine():
            ThreePointArc((69.320625418, 7.725710636), (67.574862202, 9.215149033), (66.095870628, 10.969771462))
            ThreePointArc((66.095870628, 10.969771462), (66.324895992, 9.487263657), (66.520673478, 8))
            ThreePointArc((66.520673478, 8), (67.9314334, 7.972938142), (69.320625418, 7.725710636))
        make_face()
    extrude(amount=-BOSS_EXTRUDE9_DEPTH)

    # Sketch8 → Cut-Extrude5 (cut)
    with BuildSketch(Plane.XZ):
        with Locations((0, 71.25)):
            Circle(SKETCH8_R)
        with Locations((71.25, 0)):
            Circle(SKETCH8_R)
        with Locations((0, -71.25)):
            Circle(SKETCH8_R)
        with Locations((-71.25, 0)):
            Circle(SKETCH8_R)
    extrude(amount=-CUT_EXTRUDE5_DEPTH, mode=Mode.SUBTRACT)

    # Sketch9 → Boss-Extrude10 (add)
    with BuildSketch(Plane(origin=(0, 11, 0), x_dir=(1, 0, 0), z_dir=(0, 1, 0))):
        with Locations((0, 42.5)):
            Circle(SKETCH9_R)
        with Locations((36.806079661, -21.25)):
            Circle(SKETCH9_R)
        with Locations((-36.806079661, -21.25)):
            Circle(SKETCH9_R)
    extrude(amount=BOSS_EXTRUDE10_DEPTH)

    # Sketch10 → Boss-Extrude11 (add)
    with BuildSketch(Plane(origin=(0, 16, 0), x_dir=(1, 0, 0), z_dir=(0, 1, 0))):
        with Locations((0, 42.5)):
            Circle(SKETCH10_R)
        with Locations((36.806079661, -21.25)):
            Circle(SKETCH10_R)
        with Locations((-36.806079661, -21.25)):
            Circle(SKETCH10_R)
    extrude(amount=BOSS_EXTRUDE11_DEPTH)

    # Chamfer4
    chamfer4_edges = [part.edges().sort_by_distance(p)[0] for p in [
        (-9, 16, -42.5),
        (-45.806079661, 16, 21.25),
        (27.806079661, 16, 21.25),
    ]]
    chamfer(chamfer4_edges, length=CHAMFER4_SIZE)


solid = part.part
